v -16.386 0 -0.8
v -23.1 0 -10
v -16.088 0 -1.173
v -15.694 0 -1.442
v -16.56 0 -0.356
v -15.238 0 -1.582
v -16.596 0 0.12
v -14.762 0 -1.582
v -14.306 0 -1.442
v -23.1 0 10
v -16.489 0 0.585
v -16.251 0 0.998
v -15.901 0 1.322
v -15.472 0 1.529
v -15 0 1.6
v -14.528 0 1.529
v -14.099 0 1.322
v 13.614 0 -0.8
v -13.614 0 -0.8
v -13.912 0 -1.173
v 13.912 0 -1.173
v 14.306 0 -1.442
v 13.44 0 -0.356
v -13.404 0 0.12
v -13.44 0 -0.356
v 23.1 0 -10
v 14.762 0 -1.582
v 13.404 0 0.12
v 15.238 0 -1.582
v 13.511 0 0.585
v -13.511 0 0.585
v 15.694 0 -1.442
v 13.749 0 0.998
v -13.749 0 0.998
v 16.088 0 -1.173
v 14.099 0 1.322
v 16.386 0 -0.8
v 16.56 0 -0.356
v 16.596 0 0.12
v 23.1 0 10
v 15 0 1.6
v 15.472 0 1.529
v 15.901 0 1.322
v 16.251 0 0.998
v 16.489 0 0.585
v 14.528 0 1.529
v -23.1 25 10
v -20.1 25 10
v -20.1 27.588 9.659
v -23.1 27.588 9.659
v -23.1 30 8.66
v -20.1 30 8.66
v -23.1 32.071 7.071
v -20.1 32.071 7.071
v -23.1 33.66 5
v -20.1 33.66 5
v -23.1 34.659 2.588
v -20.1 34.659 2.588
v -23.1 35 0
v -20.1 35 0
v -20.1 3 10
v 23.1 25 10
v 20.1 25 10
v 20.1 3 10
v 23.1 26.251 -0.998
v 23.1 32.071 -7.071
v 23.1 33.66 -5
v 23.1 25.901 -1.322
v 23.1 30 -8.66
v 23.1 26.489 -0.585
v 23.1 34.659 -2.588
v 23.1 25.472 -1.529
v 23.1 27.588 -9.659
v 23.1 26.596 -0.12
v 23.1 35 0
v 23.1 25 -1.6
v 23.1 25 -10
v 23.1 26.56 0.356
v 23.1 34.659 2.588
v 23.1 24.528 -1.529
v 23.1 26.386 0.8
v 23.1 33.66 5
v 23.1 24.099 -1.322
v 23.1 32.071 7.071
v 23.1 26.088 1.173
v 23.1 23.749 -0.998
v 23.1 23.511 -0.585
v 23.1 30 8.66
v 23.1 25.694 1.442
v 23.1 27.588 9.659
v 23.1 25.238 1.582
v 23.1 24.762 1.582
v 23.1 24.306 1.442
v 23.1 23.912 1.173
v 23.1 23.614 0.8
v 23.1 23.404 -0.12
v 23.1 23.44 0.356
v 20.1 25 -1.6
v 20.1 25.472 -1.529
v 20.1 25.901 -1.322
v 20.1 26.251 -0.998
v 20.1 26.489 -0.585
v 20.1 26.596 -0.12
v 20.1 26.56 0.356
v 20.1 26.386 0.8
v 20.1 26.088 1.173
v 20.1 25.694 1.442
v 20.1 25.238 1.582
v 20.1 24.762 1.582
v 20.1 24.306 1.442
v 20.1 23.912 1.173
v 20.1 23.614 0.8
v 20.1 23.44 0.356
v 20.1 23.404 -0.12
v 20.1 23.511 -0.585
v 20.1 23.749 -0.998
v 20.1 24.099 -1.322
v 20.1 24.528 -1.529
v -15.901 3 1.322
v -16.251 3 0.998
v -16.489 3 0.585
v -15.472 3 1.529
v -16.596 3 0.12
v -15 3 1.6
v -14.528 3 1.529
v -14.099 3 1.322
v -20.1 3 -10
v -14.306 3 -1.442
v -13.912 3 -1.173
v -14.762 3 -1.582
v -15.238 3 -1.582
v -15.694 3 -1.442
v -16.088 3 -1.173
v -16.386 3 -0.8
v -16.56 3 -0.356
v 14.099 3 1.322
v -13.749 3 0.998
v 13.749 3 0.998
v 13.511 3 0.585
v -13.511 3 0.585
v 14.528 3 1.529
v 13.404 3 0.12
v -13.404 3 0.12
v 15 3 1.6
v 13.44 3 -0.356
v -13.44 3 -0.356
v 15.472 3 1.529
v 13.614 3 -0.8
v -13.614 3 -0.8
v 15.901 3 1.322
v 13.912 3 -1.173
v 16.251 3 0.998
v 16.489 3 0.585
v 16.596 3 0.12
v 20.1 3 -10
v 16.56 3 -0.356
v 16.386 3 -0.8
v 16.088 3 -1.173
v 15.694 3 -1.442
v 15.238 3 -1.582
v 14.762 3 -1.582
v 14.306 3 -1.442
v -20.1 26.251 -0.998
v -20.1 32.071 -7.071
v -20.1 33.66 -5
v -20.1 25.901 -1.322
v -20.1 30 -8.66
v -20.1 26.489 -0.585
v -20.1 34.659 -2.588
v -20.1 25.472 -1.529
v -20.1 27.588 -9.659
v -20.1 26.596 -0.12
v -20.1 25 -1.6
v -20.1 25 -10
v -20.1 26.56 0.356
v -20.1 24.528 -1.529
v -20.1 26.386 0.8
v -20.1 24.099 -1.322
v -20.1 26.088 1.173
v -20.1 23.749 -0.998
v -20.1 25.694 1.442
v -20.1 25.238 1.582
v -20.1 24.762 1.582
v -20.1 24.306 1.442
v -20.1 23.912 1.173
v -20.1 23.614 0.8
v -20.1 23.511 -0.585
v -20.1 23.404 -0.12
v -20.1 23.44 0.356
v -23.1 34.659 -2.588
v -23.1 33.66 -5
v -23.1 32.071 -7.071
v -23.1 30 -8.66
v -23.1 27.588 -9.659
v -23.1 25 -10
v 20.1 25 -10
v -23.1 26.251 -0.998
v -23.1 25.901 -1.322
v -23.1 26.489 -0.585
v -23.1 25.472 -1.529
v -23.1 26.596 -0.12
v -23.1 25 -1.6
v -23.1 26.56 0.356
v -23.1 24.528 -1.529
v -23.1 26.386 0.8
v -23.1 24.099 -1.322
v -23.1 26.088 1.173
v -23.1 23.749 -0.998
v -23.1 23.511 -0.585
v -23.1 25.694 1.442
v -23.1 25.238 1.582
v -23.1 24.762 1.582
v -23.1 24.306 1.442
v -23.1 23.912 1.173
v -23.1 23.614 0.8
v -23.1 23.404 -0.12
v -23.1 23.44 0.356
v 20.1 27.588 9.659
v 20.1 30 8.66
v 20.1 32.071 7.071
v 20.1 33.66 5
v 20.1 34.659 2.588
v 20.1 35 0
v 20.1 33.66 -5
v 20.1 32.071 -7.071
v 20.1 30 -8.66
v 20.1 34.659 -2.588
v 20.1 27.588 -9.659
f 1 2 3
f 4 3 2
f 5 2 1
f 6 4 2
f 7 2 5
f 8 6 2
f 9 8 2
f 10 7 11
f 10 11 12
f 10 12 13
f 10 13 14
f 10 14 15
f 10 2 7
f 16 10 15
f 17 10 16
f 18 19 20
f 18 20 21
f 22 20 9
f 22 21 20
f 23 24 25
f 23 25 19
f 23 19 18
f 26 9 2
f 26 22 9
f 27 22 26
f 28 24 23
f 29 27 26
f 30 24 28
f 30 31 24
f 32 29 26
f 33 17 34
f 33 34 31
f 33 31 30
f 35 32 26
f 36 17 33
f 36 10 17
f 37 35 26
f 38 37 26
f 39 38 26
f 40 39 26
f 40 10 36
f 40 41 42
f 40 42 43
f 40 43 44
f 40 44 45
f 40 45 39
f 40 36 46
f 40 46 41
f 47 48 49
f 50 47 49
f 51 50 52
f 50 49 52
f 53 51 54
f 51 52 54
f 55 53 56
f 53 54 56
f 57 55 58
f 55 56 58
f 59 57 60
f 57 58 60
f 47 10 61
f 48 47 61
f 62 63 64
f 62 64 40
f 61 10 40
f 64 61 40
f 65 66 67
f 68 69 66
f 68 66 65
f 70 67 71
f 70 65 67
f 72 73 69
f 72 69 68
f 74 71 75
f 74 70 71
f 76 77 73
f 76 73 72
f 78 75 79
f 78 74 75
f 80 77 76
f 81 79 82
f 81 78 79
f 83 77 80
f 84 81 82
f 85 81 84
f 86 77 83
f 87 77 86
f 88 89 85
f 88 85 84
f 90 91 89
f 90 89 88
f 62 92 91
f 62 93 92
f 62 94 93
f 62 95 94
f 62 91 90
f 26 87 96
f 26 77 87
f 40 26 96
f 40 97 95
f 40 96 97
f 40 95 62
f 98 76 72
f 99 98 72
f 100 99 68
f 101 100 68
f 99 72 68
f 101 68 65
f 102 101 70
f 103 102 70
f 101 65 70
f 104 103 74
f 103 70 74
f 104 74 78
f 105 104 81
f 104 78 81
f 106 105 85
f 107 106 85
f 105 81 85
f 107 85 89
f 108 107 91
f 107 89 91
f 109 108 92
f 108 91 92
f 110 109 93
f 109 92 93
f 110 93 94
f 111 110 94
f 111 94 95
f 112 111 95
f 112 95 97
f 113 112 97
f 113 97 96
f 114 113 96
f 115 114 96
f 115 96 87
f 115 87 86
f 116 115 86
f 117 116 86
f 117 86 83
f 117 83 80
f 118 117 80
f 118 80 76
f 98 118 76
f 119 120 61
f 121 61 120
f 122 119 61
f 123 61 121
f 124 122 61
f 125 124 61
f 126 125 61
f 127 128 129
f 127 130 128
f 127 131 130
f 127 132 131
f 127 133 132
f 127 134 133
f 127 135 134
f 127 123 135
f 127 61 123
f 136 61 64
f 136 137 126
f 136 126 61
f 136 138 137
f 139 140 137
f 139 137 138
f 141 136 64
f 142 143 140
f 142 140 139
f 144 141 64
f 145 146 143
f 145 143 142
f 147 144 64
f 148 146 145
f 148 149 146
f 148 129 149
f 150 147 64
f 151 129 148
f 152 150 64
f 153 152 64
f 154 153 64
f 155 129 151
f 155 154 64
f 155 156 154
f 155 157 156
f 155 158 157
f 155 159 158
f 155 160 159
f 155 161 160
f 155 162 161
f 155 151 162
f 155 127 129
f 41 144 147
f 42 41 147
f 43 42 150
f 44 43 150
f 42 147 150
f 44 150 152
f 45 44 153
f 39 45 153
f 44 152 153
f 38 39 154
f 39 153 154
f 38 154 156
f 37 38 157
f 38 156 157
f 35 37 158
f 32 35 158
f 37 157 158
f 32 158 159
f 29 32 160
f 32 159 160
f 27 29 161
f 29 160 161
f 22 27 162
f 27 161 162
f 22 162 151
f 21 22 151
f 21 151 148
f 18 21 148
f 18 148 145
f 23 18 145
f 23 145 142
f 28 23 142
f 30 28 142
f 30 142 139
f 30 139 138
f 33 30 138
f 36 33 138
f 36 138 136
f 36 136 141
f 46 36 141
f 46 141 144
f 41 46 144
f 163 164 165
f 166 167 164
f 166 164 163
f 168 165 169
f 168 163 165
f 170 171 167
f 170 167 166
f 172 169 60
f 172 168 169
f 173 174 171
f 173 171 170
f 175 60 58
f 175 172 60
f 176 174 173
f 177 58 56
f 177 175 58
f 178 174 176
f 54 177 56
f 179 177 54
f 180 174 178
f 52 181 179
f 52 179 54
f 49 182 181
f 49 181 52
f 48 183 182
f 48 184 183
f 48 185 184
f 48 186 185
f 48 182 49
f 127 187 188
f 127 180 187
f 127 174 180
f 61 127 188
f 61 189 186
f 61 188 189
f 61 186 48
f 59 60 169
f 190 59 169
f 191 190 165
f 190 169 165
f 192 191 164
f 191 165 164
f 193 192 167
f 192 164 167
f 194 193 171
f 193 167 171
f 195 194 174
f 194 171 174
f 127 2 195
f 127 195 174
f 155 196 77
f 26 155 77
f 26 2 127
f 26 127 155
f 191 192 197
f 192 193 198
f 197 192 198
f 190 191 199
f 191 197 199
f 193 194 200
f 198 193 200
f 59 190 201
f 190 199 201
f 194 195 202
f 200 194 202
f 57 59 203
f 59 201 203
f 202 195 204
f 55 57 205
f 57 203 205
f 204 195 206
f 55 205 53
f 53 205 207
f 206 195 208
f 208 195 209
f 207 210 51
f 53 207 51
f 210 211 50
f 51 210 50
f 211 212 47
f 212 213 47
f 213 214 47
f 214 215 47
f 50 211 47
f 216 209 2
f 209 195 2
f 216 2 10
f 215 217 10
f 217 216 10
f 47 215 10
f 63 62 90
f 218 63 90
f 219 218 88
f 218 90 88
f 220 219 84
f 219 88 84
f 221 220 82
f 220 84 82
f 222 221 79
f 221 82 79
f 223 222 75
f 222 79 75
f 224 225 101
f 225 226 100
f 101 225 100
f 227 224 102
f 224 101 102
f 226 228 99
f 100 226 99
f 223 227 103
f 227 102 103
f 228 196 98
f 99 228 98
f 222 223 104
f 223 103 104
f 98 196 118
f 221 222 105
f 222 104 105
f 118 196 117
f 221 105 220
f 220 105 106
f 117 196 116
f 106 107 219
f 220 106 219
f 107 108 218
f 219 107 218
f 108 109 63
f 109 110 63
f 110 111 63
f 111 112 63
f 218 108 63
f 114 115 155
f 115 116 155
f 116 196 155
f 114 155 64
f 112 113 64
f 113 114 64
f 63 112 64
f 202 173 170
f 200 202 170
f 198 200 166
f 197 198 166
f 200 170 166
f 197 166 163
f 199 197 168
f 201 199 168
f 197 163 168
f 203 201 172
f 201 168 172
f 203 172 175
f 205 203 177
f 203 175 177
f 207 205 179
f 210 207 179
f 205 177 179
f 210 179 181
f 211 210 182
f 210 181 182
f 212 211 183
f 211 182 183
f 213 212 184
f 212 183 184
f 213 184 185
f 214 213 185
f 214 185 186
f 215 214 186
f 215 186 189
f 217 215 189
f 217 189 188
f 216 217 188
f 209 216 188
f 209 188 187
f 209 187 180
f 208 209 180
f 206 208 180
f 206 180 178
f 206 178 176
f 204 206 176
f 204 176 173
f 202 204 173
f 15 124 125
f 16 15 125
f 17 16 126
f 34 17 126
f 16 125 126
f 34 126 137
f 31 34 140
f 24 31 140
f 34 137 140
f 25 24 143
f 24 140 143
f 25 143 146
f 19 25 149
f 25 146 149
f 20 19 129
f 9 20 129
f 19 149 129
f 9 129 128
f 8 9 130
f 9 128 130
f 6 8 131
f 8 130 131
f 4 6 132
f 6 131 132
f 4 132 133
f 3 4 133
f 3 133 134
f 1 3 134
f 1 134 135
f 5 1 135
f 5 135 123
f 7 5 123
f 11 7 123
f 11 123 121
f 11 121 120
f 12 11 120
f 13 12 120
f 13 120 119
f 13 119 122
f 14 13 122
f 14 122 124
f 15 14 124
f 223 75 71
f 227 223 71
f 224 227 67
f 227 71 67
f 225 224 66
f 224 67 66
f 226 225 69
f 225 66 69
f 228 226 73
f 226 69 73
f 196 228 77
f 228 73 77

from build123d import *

# Parameters (mm, degrees)
ESQUISSE1_W             = 40.2
ESQUISSE1_H             = 20
BOSS_EXTRU_1_DEPTH      = 3
ESQUISSE2_W             = 3
ESQUISSE2_H             = 20
BOSS_EXTRU_2_DEPTH      = 35
ENL_V_MAT_EXTRU_1_DEPTH = 71
ESQUISSE4_R             = 1.6
ENL_V_MAT_EXTRU_2_DEPTH = 71
ESQUISSE5_R             = 1.6
ENL_V_MAT_EXTRU_3_DEPTH = 71


with BuildPart() as part:
    # Esquisse1 → Boss.-Extru.1 (new body)
    with BuildSketch(Plane(origin=(0, 0, 0), x_dir=(1, 0, 0), z_dir=(0, 1, 0))):
        Rectangle(ESQUISSE1_W, ESQUISSE1_H)
    extrude(amount=BOSS_EXTRU_1_DEPTH)

    # Esquisse2 → Boss.-Extru.2 (add)
    with BuildSketch(Plane.XZ):
        with Locations((-21.6, 0)):
            Rectangle(ESQUISSE2_W, ESQUISSE2_H)
        with Locations((21.6, 0)):
            Rectangle(ESQUISSE2_W, ESQUISSE2_H)
    extrude(amount=-BOSS_EXTRU_2_DEPTH)

    # Esquisse3 → Enlèv. mat.-Extru.1 (cut)
    with BuildSketch(Plane(origin=(23.1, 0, 0), x_dir=(0, 0, -1), z_dir=(1, 0, 0))):
        with BuildLine():
            Line((-10, 35), (-10, 25))
            ThreePointArc((-10, 25), (-7.071067812, 32.071067812), (0, 35))
            Line((0, 35), (-10, 35))
        make_face()
        with BuildLine():
            Line((10, 35), (0, 35))
            ThreePointArc((0, 35), (7.071067812, 32.071067812), (10, 25))
            Line((10, 25), (10, 35))
        make_face()
    extrude(amount=-ENL_V_MAT_EXTRU_1_DEPTH, mode=Mode.SUBTRACT)

    # Esquisse4 → Enlèv. mat.-Extru.2 (cut)
    with BuildSketch(Plane(origin=(23.1, 0, 0), x_dir=(0, 0, -1), z_dir=(1, 0, 0))):
        with Locations((0, 25)):
            Circle(ESQUISSE4_R)
    extrude(amount=-ENL_V_MAT_EXTRU_2_DEPTH, mode=Mode.SUBTRACT)

    # Esquisse5 → Enlèv. mat.-Extru.3 (cut)
    with BuildSketch(Plane(origin=(0, 3, 0), x_dir=(1, 0, 0), z_dir=(0, 1, 0))):
        with Locations(Location((-15, 0, 0), (0, 0, 270))):
            Circle(ESQUISSE5_R)
        with Locations(Location((15, 0, 0), (0, 0, 270))):
            Circle(ESQUISSE5_R)
    extrude(amount=-ENL_V_MAT_EXTRU_3_DEPTH, mode=Mode.SUBTRACT)


solid = part.part
